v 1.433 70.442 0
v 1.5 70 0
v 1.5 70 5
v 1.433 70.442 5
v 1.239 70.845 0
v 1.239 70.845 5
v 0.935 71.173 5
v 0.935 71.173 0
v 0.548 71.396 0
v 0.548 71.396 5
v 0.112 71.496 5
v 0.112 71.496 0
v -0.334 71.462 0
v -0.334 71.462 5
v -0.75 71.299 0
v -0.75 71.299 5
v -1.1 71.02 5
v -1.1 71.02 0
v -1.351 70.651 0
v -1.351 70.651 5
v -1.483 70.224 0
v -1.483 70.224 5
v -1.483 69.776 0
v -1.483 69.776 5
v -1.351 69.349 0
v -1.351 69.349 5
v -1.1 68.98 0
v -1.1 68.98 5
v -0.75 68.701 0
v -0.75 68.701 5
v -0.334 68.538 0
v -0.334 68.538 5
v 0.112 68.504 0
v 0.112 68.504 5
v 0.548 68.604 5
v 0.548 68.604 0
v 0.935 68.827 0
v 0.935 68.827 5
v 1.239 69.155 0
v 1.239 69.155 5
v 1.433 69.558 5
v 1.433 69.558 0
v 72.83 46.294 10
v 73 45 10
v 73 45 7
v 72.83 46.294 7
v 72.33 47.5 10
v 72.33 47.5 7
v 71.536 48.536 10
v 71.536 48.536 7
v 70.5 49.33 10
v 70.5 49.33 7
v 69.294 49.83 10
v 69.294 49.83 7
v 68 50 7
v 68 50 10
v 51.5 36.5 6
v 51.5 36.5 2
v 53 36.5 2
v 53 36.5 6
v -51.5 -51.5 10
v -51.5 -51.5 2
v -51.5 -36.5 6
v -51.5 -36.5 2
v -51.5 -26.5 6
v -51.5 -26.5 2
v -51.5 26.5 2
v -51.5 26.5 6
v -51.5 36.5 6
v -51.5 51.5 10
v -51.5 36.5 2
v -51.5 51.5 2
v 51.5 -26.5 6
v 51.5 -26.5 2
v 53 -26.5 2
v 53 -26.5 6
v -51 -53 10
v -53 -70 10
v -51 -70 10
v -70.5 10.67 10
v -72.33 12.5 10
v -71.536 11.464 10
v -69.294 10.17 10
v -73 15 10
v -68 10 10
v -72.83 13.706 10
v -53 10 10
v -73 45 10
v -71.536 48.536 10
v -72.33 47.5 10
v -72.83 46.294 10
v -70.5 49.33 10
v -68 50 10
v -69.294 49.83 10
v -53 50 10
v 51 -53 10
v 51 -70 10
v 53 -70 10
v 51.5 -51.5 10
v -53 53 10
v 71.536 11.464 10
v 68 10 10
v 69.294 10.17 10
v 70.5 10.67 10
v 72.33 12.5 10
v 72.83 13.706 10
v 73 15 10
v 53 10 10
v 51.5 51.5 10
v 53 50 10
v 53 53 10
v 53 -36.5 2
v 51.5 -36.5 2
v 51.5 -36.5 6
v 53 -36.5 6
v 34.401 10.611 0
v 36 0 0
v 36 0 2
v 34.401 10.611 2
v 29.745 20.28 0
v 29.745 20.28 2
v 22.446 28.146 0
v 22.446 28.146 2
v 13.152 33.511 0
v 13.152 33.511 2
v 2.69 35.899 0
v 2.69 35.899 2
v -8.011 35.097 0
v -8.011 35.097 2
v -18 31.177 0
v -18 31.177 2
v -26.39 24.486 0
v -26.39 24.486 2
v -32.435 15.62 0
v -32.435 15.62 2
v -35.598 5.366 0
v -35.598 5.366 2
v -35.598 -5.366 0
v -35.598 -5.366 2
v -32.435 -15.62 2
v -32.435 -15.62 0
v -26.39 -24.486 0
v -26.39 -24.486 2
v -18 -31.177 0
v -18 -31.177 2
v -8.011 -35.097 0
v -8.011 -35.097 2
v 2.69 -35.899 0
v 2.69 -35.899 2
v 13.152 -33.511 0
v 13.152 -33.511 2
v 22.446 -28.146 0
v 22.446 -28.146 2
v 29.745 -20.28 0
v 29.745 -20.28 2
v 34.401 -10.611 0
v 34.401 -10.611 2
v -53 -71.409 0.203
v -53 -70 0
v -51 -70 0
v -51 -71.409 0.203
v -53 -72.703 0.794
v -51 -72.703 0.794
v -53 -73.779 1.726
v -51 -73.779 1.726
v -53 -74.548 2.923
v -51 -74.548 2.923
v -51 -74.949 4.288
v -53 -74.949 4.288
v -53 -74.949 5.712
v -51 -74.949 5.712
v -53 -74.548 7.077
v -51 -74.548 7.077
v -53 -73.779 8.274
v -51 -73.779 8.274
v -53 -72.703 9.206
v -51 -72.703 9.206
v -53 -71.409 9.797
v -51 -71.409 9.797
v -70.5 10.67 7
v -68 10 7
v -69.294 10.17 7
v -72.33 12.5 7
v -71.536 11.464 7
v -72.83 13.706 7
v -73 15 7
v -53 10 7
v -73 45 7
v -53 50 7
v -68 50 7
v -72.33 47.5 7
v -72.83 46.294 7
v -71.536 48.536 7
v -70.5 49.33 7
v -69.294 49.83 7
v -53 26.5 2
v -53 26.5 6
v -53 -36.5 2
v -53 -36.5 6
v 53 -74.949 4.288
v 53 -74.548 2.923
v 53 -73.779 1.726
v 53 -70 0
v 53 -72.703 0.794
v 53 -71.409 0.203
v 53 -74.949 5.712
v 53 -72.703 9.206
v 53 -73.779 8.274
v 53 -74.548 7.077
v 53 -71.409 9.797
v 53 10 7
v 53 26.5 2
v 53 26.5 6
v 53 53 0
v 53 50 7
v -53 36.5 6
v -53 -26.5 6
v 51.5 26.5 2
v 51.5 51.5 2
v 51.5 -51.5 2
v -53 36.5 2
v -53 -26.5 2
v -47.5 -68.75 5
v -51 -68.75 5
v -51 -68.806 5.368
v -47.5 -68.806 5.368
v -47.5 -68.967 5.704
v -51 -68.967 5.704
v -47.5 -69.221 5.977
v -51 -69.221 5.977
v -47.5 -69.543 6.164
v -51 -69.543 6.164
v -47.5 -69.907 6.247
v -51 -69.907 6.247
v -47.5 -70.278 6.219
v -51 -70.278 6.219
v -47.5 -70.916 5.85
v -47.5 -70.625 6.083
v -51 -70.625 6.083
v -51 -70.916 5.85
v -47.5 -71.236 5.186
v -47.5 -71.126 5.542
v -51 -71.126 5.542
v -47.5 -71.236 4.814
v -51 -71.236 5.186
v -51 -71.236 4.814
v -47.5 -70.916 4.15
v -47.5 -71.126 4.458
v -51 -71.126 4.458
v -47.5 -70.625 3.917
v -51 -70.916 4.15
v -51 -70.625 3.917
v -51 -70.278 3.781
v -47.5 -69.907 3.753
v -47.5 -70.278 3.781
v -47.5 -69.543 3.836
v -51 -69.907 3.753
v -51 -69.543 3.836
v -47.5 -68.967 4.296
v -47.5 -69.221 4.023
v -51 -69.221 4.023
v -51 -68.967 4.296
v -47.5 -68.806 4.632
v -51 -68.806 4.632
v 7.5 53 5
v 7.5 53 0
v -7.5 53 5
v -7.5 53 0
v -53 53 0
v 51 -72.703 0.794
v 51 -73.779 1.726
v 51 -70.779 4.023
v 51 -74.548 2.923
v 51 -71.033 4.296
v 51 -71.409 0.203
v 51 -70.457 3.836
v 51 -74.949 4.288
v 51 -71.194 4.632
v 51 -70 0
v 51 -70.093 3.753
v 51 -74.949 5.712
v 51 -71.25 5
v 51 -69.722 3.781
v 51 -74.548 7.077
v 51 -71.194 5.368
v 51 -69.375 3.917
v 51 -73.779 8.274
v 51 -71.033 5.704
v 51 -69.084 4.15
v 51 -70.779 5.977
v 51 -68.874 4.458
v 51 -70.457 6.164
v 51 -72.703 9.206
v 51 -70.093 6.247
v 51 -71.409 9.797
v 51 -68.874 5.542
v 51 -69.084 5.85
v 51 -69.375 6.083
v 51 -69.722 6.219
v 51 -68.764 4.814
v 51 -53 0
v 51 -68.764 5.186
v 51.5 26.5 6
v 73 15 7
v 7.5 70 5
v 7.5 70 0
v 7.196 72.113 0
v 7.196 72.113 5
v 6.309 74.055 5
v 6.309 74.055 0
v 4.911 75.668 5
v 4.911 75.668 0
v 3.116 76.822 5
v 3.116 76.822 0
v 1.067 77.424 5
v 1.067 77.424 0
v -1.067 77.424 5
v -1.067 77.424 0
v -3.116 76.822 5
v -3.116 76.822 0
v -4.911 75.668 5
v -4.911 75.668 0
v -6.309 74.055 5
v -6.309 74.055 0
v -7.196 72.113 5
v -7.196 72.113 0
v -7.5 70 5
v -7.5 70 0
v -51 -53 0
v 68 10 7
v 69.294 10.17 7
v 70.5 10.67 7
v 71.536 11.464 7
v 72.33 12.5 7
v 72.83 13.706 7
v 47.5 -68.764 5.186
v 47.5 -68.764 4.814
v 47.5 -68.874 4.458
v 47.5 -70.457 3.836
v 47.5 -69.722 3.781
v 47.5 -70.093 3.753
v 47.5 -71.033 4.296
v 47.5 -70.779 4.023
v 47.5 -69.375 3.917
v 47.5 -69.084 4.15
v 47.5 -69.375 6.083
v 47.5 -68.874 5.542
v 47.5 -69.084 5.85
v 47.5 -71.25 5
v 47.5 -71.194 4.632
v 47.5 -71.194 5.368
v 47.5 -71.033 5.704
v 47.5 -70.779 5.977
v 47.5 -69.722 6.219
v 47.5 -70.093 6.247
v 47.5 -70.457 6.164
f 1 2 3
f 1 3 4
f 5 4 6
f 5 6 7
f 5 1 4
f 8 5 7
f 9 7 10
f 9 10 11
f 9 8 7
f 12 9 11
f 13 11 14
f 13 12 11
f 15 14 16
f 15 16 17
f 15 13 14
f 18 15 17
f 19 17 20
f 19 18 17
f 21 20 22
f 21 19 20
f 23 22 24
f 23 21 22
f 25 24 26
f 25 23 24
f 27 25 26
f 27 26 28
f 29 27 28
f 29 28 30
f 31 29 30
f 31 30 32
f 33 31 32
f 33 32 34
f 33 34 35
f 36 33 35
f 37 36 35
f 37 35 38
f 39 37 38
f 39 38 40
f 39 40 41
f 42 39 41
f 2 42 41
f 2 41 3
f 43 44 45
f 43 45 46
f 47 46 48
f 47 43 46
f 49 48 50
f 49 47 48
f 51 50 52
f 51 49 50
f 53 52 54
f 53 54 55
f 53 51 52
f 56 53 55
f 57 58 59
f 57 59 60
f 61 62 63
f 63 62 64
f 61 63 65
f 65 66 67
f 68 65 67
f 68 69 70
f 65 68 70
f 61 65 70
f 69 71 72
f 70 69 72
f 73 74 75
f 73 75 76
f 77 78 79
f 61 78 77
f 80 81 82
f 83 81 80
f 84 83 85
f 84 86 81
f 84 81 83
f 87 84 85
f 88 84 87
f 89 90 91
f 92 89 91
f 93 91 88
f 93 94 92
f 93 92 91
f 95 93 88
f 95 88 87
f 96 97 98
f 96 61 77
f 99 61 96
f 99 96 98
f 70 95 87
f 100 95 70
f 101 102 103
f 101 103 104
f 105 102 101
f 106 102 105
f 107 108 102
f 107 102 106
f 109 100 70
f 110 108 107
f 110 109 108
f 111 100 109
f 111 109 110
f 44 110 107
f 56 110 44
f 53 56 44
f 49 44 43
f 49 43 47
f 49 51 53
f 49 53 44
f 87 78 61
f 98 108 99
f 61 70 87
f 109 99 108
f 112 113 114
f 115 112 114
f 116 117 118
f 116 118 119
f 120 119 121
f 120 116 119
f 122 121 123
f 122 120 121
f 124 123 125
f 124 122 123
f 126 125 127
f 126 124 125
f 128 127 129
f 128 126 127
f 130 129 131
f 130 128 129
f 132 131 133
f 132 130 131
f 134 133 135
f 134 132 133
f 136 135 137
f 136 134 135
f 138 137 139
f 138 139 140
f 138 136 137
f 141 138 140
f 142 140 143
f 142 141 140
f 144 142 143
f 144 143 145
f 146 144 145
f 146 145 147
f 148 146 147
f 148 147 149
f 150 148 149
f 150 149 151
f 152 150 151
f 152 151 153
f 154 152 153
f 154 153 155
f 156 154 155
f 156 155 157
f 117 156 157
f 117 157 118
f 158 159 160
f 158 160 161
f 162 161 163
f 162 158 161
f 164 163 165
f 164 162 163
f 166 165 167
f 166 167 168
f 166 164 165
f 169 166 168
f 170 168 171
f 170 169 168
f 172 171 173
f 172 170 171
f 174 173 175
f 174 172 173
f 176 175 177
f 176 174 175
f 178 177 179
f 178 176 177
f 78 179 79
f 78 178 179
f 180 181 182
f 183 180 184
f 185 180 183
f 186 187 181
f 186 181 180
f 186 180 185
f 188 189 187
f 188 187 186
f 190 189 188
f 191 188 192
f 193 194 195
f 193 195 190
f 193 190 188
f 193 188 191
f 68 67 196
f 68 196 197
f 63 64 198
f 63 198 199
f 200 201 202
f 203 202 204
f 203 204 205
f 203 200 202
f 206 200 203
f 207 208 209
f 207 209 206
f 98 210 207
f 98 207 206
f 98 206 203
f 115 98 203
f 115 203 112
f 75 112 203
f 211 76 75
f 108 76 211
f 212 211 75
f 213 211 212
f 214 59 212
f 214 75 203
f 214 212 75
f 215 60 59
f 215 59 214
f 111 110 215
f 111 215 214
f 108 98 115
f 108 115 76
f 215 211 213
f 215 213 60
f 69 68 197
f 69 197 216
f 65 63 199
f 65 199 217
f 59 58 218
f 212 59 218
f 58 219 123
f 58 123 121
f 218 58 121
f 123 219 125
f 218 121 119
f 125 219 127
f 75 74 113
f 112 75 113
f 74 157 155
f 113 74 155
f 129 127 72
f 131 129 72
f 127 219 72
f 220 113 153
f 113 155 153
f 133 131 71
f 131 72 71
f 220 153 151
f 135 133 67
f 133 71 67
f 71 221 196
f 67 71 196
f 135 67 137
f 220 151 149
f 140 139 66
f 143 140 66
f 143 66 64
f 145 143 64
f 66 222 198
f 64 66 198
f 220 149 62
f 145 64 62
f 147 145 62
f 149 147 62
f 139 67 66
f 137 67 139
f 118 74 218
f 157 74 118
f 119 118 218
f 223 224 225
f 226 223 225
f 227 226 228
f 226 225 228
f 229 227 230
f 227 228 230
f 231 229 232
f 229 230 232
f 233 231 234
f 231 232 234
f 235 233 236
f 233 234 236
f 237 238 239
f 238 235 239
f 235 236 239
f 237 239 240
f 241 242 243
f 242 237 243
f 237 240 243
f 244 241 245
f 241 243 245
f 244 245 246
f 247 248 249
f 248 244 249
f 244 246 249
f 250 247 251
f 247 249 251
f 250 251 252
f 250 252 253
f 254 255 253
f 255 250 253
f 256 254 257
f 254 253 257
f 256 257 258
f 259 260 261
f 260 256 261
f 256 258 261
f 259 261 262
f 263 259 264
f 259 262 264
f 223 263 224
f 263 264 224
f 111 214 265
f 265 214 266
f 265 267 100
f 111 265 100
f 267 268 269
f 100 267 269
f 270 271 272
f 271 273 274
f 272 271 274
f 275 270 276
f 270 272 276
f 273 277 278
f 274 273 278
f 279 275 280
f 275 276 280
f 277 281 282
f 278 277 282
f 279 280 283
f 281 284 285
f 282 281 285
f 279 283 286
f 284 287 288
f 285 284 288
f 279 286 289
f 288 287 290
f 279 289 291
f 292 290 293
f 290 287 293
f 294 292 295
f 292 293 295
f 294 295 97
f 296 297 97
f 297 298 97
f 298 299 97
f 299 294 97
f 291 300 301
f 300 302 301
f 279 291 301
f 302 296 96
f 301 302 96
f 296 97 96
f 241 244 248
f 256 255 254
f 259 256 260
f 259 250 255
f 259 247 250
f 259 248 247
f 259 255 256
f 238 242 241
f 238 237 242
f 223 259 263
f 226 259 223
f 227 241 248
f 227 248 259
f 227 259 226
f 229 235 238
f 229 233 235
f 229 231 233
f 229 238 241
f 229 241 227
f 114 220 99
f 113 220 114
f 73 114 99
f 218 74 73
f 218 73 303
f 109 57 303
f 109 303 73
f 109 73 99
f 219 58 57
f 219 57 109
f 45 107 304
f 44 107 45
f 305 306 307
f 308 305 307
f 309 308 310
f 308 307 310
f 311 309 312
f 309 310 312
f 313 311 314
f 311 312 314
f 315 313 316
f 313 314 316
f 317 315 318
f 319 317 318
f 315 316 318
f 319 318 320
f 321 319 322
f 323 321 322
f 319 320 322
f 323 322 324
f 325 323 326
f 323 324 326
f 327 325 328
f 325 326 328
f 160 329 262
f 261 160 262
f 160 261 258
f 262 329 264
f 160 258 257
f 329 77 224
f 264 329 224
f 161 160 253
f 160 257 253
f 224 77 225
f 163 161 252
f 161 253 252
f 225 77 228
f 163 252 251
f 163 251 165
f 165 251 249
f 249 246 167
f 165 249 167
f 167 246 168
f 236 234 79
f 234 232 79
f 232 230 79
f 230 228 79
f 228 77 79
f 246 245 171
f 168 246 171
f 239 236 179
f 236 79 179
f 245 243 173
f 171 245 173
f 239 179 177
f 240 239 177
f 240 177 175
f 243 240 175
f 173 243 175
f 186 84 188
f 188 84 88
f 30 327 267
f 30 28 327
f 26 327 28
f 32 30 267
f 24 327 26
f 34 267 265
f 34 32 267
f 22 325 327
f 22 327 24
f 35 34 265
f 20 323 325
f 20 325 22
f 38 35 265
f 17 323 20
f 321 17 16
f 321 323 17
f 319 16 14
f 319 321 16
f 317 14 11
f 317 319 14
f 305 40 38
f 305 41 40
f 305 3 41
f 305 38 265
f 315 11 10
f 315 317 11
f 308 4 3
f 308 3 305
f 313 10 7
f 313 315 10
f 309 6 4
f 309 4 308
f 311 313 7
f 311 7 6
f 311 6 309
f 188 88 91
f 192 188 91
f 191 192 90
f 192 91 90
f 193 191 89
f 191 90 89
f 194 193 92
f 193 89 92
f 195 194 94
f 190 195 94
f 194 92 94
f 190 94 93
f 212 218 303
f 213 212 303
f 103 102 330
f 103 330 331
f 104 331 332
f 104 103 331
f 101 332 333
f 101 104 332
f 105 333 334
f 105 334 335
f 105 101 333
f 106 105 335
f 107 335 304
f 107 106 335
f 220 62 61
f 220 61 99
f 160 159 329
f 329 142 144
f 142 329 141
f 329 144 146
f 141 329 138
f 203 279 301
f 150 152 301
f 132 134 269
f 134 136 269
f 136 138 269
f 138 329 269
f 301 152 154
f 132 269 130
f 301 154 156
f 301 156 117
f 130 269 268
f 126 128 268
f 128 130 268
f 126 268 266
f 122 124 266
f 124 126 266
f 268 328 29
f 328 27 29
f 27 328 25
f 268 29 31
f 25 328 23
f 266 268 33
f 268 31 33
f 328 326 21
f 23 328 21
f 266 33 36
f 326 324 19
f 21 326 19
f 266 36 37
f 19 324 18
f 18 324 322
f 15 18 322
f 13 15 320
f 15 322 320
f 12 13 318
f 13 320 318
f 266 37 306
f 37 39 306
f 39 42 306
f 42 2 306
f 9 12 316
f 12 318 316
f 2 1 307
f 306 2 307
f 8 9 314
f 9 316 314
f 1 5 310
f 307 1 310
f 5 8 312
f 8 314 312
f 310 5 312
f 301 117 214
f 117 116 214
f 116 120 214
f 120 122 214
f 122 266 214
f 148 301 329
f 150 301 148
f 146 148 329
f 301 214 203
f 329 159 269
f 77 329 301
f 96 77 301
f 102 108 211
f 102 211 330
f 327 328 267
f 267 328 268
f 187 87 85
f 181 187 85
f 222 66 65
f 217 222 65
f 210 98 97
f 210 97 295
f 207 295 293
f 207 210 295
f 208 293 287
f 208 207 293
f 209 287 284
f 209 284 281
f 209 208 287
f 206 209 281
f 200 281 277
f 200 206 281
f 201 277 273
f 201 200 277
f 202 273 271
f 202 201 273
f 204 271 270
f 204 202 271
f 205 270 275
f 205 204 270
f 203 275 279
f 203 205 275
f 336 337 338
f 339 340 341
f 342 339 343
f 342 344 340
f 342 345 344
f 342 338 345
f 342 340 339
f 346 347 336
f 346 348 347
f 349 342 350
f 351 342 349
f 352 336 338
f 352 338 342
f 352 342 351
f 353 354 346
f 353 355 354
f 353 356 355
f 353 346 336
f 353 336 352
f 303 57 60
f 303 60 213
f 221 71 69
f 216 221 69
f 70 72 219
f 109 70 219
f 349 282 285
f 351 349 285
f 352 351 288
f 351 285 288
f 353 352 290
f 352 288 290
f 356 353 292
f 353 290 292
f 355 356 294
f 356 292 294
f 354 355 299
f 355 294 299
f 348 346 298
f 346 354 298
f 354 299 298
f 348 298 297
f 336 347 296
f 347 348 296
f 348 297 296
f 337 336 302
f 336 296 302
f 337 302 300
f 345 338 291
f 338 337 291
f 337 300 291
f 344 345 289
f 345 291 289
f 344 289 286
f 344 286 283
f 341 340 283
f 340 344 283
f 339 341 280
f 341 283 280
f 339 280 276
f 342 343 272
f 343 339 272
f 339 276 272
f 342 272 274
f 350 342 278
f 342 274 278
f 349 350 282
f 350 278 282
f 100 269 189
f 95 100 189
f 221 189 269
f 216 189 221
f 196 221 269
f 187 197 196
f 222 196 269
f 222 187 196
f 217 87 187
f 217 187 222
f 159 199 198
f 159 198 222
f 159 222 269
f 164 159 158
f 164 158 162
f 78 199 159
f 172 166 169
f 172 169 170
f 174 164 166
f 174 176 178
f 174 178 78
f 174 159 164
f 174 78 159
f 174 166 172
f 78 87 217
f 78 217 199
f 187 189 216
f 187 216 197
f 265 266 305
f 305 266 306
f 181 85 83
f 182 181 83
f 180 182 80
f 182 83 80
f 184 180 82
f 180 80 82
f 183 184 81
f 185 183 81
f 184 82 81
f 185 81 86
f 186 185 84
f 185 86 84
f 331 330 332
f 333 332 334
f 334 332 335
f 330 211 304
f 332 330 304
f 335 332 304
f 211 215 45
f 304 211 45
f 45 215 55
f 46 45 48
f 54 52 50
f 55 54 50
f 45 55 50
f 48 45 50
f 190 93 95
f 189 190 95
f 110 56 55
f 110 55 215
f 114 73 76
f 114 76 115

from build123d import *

# Parameters (mm, degrees)
F0_W      = 103
F0_H      = 103
F1_DEPTH  = 10
F0_R      = 36
F2_DEPTH  = 2
F0_R_2    = 1.5
F4_DEPTH  = 5
F3_W      = 10
F3_H      = 4
F5_DEPTH  = 25
F6_W      = 10
F6_H      = 4
F7_DEPTH  = 25
F8_W      = 2
F8_H      = 10
F9_DEPTH  = 17
F11_DEPTH = 2
F13_DEPTH = 2
F14_R     = 1.25
F15_DEPTH = 3.5
F16_R     = 1.25
F17_DEPTH = 3.5
F19_DEPTH = 3


with BuildPart() as f1:
    # F0 (on Top) → F1 (new body)
    with BuildSketch(Plane.XY):
        Polygon((53, -53), (53, 53), (7.5, 53), (-7.5, 53), (-53, 53), (-53, -53), align=None)
        Rectangle(F0_W, F0_H, mode=Mode.SUBTRACT)
    extrude(amount=F1_DEPTH)

    # F0 (on Top) → F2 (join)
    with BuildSketch(Plane.XY):
        Rectangle(F0_W, F0_H)
        Circle(F0_R, mode=Mode.SUBTRACT)
    extrude(amount=F2_DEPTH)

    # F0 (on Top) → F4 (join)
    with BuildSketch(Plane.XY):
        Polygon((53, -53), (53, 53), (7.5, 53), (-7.5, 53), (-53, 53), (-53, -53), align=None)
        Rectangle(F0_W, F0_H, mode=Mode.SUBTRACT)
        with BuildLine():
            Line((-7.5, 53), (7.5, 53))
            Line((7.5, 53), (7.5, 70))
            ThreePointArc((7.5, 70), (0, 77.5), (-7.5, 70))
            Line((-7.5, 70), (-7.5, 53))
        make_face()
        with Locations((0, 70)):
            Circle(F0_R_2, mode=Mode.SUBTRACT)
    extrude(amount=F4_DEPTH)

    # F3 (on face) → F5 (cut)
    with BuildSketch(Plane.YZ.offset(-51.5)):
        with Locations((31.5, 4)):
            Rectangle(F3_W, F3_H)
        with Locations((-31.5, 4)):
            Rectangle(F3_W, F3_H)
    extrude(amount=-F5_DEPTH, mode=Mode.SUBTRACT)

    # F6 (on face) → F7 (cut)
    with BuildSketch(Plane(origin=(51.5, 0, 0), x_dir=(0, -1, 0), z_dir=(-1, 0, 0))):
        with Locations((-31.5, 4)):
            Rectangle(F6_W, F6_H)
        with Locations((31.5, 4)):
            Rectangle(F6_W, F6_H)
    extrude(amount=-F7_DEPTH, mode=Mode.SUBTRACT)

    # F8 (on face) → F9 (join)
    with BuildSketch(Plane.XZ.offset(53)):
        with Locations((-52, 5)):
            Rectangle(F8_W, F8_H)
        with Locations((52, 5)):
            Rectangle(F8_W, F8_H)
    extrude(amount=F9_DEPTH)

    # F10 (on face) → F11 (join)
    with BuildSketch(Plane(origin=(-53, 0, 0), x_dir=(0, -1, 0), z_dir=(-1, 0, 0))):
        with BuildLine():
            Line((70, 10), (70, 0))
            ThreePointArc((70, 0), (75, 5), (70, 10))
        make_face()
    extrude(amount=-F11_DEPTH)

    # F12 (on face) → F13 (join)
    with BuildSketch(Plane.YZ.offset(53)):
        with BuildLine():
            Line((-70, 0), (-70, 10))
            ThreePointArc((-70, 10), (-75, 5), (-70, 0))
        make_face()
    extrude(amount=-F13_DEPTH)

    # F14 (on face) → F15 (join)
    with BuildSketch(Plane.YZ.offset(-51)):
        with Locations((-70, 5)):
            Circle(F14_R)
    extrude(amount=F15_DEPTH)

    # F16 (on face) → F17 (join)
    with BuildSketch(Plane(origin=(51, 0, 0), x_dir=(0, -1, 0), z_dir=(-1, 0, 0))):
        with Locations((70, 5)):
            Circle(F16_R)
    extrude(amount=F17_DEPTH)

    # F18 (on face) → F19 (join)
    with BuildSketch(Plane.XY.offset(10)):
        with BuildLine():
            Line((68, 50), (53, 50))
            Line((53, 50), (53, 10))
            Line((53, 10), (68, 10))
            ThreePointArc((68, 10), (71.5355339059, 11.4644660941), (73, 15))
            Line((73, 15), (73, 45))
            ThreePointArc((73, 45), (71.5355339059, 48.5355339059), (68, 50))
        make_face()
    extrude(amount=-F19_DEPTH)

    # F20: F1 across plane


with BuildPart() as f1_1:
    add(f1.part)
    add(f1.part.mirror(Plane.YZ))


solid = f1_1.part
